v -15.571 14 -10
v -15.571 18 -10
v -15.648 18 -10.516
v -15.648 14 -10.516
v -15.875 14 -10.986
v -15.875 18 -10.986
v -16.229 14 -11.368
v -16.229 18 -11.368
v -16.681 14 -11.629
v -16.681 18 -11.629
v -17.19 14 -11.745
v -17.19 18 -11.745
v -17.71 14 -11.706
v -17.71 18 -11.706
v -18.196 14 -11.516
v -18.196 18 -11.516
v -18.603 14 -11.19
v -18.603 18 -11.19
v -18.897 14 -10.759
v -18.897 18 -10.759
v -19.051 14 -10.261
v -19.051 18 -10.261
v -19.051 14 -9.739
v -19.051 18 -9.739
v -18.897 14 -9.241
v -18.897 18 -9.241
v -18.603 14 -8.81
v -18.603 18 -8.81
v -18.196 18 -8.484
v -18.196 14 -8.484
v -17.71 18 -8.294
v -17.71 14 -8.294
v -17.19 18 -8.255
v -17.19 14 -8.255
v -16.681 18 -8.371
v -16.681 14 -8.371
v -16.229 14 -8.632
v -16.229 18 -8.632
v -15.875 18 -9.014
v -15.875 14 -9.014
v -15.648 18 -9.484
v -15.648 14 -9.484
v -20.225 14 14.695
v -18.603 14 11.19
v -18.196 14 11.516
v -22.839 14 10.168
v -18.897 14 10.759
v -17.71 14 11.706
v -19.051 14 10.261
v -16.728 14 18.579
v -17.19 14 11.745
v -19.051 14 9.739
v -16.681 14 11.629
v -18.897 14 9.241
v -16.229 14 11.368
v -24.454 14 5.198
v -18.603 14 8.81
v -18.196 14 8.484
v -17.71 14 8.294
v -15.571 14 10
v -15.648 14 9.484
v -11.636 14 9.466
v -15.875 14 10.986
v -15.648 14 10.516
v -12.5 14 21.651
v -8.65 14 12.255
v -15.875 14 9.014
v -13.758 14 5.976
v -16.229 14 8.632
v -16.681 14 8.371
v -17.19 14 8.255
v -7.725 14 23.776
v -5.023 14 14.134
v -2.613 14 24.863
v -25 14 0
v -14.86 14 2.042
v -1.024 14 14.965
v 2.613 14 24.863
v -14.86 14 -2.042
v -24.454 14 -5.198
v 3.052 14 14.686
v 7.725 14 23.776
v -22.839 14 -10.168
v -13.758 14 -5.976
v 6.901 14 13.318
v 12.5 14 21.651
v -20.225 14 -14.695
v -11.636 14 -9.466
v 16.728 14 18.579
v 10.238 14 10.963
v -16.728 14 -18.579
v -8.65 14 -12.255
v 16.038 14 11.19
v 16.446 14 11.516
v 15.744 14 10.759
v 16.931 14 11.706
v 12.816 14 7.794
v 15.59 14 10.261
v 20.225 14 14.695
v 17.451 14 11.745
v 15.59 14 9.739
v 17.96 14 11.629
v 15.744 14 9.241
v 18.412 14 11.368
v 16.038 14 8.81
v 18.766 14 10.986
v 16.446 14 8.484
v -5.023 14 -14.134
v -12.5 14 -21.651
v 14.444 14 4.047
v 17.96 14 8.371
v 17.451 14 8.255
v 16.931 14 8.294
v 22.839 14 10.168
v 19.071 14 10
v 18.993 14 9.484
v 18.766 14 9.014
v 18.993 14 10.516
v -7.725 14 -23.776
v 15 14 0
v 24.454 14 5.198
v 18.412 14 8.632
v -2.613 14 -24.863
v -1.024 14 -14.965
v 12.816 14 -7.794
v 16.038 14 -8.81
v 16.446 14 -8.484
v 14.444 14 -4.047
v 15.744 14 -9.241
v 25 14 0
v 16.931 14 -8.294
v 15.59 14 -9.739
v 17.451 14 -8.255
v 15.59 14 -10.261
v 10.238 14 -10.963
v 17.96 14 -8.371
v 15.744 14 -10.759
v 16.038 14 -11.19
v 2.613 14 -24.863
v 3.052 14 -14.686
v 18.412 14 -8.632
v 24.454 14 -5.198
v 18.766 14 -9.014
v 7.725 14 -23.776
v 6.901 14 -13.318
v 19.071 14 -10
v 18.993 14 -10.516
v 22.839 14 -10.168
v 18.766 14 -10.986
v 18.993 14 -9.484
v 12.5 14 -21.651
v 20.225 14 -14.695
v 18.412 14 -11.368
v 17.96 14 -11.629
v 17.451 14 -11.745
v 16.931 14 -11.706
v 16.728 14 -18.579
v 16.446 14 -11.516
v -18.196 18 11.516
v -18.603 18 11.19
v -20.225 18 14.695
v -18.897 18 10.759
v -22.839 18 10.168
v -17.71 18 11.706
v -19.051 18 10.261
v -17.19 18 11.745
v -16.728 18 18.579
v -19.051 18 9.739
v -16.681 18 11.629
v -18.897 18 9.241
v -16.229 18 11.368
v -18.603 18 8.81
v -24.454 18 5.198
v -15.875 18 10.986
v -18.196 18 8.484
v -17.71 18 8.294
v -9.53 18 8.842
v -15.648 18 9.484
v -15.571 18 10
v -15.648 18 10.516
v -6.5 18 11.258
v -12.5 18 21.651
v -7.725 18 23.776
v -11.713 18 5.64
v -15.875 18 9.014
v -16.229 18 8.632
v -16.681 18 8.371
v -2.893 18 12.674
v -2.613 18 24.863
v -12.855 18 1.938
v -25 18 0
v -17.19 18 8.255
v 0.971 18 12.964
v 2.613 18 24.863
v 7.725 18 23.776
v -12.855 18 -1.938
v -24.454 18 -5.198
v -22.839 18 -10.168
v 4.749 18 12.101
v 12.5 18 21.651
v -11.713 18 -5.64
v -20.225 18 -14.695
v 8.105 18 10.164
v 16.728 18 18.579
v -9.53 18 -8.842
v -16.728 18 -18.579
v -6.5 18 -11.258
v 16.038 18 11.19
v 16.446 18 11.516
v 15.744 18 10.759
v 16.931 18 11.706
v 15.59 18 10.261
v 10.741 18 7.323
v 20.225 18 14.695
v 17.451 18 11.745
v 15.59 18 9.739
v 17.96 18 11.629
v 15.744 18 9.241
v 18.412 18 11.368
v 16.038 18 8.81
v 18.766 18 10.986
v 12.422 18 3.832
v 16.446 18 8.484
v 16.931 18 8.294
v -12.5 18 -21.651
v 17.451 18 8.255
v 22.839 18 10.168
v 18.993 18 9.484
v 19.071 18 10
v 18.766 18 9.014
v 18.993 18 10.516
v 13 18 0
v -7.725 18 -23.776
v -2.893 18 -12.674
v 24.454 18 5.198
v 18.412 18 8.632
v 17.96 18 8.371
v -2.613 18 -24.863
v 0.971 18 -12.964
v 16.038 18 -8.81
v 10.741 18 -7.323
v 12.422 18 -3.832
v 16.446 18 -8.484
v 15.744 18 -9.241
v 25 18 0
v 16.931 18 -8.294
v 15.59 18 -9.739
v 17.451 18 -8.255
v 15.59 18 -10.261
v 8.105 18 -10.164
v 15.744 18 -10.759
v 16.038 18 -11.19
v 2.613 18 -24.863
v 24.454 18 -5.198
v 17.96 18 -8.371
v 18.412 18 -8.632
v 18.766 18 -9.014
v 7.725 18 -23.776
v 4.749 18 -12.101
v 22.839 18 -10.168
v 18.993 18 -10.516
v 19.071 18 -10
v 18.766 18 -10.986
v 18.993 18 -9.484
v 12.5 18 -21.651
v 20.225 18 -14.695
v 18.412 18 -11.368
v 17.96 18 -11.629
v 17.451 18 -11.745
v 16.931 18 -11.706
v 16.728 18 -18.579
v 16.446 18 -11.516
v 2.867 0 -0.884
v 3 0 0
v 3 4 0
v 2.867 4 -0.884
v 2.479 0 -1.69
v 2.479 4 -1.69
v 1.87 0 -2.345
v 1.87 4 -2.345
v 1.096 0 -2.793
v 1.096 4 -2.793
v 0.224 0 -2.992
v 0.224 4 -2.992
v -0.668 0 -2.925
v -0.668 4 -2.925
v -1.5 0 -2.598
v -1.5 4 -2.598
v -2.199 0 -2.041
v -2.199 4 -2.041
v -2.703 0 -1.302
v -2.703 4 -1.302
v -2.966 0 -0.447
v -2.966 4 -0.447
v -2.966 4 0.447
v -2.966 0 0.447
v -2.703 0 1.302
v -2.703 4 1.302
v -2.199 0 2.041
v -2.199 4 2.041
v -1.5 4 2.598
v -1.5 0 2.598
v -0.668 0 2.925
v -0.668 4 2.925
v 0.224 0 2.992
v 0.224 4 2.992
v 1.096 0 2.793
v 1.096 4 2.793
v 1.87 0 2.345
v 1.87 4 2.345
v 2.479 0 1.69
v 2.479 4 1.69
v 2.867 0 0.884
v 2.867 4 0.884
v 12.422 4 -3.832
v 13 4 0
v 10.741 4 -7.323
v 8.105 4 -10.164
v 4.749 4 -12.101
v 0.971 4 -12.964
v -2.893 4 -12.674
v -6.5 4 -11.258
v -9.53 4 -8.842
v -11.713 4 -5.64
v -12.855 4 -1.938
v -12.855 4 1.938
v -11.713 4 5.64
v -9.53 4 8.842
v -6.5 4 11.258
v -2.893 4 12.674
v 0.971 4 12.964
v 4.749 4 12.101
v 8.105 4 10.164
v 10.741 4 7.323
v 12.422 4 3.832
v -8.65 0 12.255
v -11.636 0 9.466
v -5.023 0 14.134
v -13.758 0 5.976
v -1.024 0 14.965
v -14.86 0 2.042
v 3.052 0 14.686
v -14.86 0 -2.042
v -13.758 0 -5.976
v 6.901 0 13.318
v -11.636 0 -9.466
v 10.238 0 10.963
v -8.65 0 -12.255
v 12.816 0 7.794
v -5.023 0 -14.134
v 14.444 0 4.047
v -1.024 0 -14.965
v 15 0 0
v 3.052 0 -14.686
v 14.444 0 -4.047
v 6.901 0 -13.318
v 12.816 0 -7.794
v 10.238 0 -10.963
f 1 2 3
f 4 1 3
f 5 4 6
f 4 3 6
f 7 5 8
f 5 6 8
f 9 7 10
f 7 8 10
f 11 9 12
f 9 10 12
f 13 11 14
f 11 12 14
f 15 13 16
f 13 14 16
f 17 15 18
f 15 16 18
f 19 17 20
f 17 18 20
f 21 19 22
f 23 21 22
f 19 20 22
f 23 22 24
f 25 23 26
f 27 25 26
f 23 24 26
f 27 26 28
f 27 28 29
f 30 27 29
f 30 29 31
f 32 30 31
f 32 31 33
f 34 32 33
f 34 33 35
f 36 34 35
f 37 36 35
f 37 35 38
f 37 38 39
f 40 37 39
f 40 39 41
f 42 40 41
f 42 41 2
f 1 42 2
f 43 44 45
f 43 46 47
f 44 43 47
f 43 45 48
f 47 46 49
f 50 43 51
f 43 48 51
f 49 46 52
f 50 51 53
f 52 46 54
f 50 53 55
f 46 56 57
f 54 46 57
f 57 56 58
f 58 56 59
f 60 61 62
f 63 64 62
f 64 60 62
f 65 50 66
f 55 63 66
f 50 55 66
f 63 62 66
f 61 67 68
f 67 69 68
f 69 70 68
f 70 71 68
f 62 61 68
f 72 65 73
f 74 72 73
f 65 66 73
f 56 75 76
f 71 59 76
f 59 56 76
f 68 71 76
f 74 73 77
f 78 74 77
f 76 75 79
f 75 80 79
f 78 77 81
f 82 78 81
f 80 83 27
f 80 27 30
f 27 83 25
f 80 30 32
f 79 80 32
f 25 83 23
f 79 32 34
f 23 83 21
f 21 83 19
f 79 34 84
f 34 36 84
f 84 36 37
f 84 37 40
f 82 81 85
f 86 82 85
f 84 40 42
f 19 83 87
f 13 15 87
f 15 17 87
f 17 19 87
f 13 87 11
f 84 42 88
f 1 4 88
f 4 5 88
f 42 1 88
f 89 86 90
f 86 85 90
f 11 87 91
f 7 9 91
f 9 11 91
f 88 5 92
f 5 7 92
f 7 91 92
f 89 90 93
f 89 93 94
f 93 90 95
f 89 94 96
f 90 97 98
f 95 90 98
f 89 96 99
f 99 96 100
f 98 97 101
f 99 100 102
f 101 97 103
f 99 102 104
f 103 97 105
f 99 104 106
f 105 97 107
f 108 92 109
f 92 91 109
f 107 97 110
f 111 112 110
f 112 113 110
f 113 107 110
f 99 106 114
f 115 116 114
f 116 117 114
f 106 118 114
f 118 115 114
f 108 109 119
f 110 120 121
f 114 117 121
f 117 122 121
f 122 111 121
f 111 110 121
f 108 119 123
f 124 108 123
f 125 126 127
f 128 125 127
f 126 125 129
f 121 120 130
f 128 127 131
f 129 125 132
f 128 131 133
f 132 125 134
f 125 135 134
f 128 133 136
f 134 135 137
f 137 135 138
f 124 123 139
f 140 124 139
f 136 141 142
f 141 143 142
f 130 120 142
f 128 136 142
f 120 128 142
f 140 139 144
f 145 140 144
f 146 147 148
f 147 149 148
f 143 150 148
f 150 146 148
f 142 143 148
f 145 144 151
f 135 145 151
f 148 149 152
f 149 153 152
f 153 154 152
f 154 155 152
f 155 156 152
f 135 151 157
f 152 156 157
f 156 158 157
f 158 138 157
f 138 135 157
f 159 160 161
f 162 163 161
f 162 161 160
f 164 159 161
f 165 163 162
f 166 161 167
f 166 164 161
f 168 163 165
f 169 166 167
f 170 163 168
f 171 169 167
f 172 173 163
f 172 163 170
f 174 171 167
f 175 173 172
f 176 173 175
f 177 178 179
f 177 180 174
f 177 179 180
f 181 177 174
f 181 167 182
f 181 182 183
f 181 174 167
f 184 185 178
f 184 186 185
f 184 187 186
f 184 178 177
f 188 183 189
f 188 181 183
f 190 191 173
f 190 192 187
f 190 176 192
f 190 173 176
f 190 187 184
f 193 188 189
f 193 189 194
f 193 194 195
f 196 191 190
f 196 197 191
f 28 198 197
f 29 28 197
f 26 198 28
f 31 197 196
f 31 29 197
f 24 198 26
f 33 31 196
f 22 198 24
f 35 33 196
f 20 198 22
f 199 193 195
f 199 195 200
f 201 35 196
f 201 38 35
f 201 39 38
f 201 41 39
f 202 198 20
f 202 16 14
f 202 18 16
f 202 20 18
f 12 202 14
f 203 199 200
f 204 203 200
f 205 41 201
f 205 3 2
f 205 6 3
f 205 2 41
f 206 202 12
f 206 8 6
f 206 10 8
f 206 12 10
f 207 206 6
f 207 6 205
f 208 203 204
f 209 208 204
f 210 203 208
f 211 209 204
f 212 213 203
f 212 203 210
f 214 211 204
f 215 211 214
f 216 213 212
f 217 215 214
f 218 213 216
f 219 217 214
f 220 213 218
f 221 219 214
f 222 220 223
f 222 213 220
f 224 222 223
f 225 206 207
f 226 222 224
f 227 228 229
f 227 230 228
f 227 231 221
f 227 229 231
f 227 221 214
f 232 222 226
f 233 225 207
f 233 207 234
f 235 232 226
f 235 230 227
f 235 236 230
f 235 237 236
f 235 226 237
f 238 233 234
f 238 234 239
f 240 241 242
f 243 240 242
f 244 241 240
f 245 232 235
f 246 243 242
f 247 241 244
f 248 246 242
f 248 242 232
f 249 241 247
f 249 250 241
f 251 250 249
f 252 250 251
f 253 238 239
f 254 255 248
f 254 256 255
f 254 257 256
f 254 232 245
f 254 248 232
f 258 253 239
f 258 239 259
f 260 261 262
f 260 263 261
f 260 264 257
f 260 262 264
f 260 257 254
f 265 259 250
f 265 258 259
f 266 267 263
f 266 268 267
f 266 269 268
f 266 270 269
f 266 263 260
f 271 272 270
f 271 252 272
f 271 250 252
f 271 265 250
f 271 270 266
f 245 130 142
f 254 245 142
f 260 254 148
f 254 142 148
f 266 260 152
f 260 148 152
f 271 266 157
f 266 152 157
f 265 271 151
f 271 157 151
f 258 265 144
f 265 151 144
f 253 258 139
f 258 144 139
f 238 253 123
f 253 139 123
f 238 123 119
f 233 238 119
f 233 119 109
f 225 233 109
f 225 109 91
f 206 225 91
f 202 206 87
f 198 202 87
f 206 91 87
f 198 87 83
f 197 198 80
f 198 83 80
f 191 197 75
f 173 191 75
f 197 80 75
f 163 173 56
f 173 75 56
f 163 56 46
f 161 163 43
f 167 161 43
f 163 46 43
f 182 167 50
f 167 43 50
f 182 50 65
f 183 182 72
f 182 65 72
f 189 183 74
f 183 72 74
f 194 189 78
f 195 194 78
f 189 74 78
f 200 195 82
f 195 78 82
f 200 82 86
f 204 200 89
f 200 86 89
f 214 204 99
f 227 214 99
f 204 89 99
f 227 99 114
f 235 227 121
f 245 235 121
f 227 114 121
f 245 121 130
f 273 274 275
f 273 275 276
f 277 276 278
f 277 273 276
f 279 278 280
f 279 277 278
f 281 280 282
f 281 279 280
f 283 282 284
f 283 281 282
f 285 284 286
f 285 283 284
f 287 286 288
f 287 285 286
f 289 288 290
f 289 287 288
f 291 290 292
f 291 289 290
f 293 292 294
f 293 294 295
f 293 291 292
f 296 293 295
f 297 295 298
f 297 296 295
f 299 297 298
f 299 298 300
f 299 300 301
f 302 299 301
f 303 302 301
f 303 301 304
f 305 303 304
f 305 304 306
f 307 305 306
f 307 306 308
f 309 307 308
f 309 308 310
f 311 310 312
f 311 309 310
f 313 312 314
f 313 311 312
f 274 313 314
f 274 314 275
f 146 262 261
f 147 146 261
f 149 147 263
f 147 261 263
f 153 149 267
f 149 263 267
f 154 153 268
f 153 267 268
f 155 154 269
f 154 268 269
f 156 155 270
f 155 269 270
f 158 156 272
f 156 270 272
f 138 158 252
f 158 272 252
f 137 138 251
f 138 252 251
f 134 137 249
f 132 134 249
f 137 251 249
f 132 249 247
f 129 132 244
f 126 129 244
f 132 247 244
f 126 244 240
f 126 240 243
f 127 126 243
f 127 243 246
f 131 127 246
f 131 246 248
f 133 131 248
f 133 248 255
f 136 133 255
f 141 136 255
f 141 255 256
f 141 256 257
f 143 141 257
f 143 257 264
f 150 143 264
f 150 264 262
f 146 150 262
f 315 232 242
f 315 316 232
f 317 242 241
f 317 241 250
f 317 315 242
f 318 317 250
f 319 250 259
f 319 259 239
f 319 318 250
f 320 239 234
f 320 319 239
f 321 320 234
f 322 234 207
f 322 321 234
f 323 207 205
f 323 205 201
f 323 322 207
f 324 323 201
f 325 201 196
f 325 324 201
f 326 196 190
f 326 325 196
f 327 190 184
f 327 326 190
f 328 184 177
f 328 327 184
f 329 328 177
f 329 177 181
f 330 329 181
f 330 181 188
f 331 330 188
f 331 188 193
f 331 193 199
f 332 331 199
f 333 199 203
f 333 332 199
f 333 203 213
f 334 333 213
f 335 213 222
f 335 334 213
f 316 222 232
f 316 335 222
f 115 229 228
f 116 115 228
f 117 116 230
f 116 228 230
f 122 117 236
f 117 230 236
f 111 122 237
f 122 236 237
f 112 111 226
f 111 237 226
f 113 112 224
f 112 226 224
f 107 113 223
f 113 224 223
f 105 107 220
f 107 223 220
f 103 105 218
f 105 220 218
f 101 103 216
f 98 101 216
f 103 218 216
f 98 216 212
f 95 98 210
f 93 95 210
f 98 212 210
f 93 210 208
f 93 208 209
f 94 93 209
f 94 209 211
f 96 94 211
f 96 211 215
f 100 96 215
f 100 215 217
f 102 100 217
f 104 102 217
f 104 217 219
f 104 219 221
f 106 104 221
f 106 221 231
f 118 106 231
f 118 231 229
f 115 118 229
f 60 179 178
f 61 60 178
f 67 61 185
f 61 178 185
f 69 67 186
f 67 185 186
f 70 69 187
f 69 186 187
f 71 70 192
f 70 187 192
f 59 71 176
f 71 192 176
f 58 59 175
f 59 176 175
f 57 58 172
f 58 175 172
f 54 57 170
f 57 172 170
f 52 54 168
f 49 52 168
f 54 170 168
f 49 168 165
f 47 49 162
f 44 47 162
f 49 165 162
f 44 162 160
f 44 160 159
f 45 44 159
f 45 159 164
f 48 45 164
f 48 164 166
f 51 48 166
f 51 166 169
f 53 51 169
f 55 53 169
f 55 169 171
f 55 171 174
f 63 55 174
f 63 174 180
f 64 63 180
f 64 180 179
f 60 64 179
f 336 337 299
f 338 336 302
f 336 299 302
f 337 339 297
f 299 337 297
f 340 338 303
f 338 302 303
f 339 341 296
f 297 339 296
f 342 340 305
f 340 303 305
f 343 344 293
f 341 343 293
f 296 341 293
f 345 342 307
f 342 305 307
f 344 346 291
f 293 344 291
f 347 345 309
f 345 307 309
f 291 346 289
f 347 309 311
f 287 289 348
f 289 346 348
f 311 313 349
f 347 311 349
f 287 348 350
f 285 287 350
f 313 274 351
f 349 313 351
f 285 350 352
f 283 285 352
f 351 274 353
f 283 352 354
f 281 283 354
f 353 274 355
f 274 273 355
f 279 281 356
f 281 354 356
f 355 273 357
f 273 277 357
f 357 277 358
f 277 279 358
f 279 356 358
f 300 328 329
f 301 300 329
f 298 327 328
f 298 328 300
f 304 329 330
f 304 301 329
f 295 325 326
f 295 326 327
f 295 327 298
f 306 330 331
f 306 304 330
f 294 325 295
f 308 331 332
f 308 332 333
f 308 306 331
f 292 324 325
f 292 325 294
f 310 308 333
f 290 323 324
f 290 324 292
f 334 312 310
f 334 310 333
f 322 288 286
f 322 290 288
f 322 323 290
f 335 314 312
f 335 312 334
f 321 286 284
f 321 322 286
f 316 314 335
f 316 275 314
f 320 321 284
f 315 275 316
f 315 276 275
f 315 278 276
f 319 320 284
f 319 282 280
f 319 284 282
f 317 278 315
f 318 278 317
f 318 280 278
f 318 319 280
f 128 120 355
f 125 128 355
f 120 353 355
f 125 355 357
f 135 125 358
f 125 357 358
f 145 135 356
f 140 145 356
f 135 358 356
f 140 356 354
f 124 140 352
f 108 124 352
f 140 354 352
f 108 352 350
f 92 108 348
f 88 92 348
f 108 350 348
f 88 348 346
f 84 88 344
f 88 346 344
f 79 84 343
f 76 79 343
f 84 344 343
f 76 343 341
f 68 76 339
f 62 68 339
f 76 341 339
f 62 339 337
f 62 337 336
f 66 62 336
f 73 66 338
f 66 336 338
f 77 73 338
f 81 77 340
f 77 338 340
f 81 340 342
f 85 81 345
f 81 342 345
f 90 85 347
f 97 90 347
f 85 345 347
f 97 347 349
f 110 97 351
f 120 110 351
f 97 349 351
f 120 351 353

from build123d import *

# Parameters (mm, degrees)
SKETCH1_R           = 15
SKETCH1_R_2         = 3
BOSS_EXTRUDE1_DEPTH = 4
SKETCH2_R           = 15
SKETCH2_R_2         = 13
EXTRUDE_THIN1_DEPTH = 10
SKETCH3_R           = 25
SKETCH3_R_2         = 13
BOSS_EXTRUDE2_DEPTH = 4
CUT_EXTRUDE1_REACH  = 20
SKETCH4_R           = 1.75


with BuildPart() as part:
    # Sketch1 → Boss-Extrude1 (new body)
    with BuildSketch(Plane(origin=(0, 0, 0), x_dir=(1, 0, 0), z_dir=(0, 1, 0))):
        Circle(SKETCH1_R)
        Circle(SKETCH1_R_2, mode=Mode.SUBTRACT)
    extrude(amount=BOSS_EXTRUDE1_DEPTH)

    # Sketch2 → Extrude-Thin1 (add)
    with BuildSketch(Plane(origin=(0, 4, 0), x_dir=(1, 0, 0), z_dir=(0, 1, 0))):
        Circle(SKETCH2_R)
        Circle(SKETCH2_R_2, mode=Mode.SUBTRACT)
    extrude(amount=EXTRUDE_THIN1_DEPTH)

    # Sketch3 → Boss-Extrude2 (add)
    with BuildSketch(Plane(origin=(0, 14, 0), x_dir=(1, 0, 0), z_dir=(0, 1, 0))):
        Circle(SKETCH3_R)
        Circle(SKETCH3_R_2, mode=Mode.SUBTRACT)
    extrude(amount=BOSS_EXTRUDE2_DEPTH)

    # Sketch4 → Cut-Extrude1 (cut, up to next)
    with BuildSketch(Plane(origin=(0, 18, 0), x_dir=(1, 0, 0), z_dir=(0, 1, 0)), mode=Mode.PRIVATE) as cut_extrude1_sk1:
        with Locations((-17.320508076, 10)):
            Circle(SKETCH4_R)
    cut_extrude1_tool1 = extrude(cut_extrude1_sk1.sketch, amount=-CUT_EXTRUDE1_REACH, mode=Mode.PRIVATE) & part.part
    add(cut_extrude1_tool1.solids().sort_by_distance((-17.320508, 18, -10))[0], mode=Mode.SUBTRACT)
    # Sketch4 → Cut-Extrude1 (cut, up to next)
    with BuildSketch(Plane(origin=(0, 18, 0), x_dir=(1, 0, 0), z_dir=(0, 1, 0)), mode=Mode.PRIVATE) as cut_extrude1_sk2:
        with Locations((17.320508076, 10)):
            Circle(SKETCH4_R)
    cut_extrude1_tool2 = extrude(cut_extrude1_sk2.sketch, amount=-CUT_EXTRUDE1_REACH, mode=Mode.PRIVATE) & part.part
    add(cut_extrude1_tool2.solids().sort_by_distance((17.320508, 18, -10))[0], mode=Mode.SUBTRACT)
    # Sketch4 → Cut-Extrude1 (cut, up to next)
    with BuildSketch(Plane(origin=(0, 18, 0), x_dir=(1, 0, 0), z_dir=(0, 1, 0)), mode=Mode.PRIVATE) as cut_extrude1_sk3:
        with Locations((17.320508076, -10)):
            Circle(SKETCH4_R)
    cut_extrude1_tool3 = extrude(cut_extrude1_sk3.sketch, amount=-CUT_EXTRUDE1_REACH, mode=Mode.PRIVATE) & part.part
    add(cut_extrude1_tool3.solids().sort_by_distance((17.320508, 18, 10))[0], mode=Mode.SUBTRACT)
    # Sketch4 → Cut-Extrude1 (cut, up to next)
    with BuildSketch(Plane(origin=(0, 18, 0), x_dir=(1, 0, 0), z_dir=(0, 1, 0)), mode=Mode.PRIVATE) as cut_extrude1_sk4:
        with Locations((-17.320508076, -10)):
            Circle(SKETCH4_R)
    cut_extrude1_tool4 = extrude(cut_extrude1_sk4.sketch, amount=-CUT_EXTRUDE1_REACH, mode=Mode.PRIVATE) & part.part
    add(cut_extrude1_tool4.solids().sort_by_distance((-17.320508, 18, 10))[0], mode=Mode.SUBTRACT)


solid = part.part
